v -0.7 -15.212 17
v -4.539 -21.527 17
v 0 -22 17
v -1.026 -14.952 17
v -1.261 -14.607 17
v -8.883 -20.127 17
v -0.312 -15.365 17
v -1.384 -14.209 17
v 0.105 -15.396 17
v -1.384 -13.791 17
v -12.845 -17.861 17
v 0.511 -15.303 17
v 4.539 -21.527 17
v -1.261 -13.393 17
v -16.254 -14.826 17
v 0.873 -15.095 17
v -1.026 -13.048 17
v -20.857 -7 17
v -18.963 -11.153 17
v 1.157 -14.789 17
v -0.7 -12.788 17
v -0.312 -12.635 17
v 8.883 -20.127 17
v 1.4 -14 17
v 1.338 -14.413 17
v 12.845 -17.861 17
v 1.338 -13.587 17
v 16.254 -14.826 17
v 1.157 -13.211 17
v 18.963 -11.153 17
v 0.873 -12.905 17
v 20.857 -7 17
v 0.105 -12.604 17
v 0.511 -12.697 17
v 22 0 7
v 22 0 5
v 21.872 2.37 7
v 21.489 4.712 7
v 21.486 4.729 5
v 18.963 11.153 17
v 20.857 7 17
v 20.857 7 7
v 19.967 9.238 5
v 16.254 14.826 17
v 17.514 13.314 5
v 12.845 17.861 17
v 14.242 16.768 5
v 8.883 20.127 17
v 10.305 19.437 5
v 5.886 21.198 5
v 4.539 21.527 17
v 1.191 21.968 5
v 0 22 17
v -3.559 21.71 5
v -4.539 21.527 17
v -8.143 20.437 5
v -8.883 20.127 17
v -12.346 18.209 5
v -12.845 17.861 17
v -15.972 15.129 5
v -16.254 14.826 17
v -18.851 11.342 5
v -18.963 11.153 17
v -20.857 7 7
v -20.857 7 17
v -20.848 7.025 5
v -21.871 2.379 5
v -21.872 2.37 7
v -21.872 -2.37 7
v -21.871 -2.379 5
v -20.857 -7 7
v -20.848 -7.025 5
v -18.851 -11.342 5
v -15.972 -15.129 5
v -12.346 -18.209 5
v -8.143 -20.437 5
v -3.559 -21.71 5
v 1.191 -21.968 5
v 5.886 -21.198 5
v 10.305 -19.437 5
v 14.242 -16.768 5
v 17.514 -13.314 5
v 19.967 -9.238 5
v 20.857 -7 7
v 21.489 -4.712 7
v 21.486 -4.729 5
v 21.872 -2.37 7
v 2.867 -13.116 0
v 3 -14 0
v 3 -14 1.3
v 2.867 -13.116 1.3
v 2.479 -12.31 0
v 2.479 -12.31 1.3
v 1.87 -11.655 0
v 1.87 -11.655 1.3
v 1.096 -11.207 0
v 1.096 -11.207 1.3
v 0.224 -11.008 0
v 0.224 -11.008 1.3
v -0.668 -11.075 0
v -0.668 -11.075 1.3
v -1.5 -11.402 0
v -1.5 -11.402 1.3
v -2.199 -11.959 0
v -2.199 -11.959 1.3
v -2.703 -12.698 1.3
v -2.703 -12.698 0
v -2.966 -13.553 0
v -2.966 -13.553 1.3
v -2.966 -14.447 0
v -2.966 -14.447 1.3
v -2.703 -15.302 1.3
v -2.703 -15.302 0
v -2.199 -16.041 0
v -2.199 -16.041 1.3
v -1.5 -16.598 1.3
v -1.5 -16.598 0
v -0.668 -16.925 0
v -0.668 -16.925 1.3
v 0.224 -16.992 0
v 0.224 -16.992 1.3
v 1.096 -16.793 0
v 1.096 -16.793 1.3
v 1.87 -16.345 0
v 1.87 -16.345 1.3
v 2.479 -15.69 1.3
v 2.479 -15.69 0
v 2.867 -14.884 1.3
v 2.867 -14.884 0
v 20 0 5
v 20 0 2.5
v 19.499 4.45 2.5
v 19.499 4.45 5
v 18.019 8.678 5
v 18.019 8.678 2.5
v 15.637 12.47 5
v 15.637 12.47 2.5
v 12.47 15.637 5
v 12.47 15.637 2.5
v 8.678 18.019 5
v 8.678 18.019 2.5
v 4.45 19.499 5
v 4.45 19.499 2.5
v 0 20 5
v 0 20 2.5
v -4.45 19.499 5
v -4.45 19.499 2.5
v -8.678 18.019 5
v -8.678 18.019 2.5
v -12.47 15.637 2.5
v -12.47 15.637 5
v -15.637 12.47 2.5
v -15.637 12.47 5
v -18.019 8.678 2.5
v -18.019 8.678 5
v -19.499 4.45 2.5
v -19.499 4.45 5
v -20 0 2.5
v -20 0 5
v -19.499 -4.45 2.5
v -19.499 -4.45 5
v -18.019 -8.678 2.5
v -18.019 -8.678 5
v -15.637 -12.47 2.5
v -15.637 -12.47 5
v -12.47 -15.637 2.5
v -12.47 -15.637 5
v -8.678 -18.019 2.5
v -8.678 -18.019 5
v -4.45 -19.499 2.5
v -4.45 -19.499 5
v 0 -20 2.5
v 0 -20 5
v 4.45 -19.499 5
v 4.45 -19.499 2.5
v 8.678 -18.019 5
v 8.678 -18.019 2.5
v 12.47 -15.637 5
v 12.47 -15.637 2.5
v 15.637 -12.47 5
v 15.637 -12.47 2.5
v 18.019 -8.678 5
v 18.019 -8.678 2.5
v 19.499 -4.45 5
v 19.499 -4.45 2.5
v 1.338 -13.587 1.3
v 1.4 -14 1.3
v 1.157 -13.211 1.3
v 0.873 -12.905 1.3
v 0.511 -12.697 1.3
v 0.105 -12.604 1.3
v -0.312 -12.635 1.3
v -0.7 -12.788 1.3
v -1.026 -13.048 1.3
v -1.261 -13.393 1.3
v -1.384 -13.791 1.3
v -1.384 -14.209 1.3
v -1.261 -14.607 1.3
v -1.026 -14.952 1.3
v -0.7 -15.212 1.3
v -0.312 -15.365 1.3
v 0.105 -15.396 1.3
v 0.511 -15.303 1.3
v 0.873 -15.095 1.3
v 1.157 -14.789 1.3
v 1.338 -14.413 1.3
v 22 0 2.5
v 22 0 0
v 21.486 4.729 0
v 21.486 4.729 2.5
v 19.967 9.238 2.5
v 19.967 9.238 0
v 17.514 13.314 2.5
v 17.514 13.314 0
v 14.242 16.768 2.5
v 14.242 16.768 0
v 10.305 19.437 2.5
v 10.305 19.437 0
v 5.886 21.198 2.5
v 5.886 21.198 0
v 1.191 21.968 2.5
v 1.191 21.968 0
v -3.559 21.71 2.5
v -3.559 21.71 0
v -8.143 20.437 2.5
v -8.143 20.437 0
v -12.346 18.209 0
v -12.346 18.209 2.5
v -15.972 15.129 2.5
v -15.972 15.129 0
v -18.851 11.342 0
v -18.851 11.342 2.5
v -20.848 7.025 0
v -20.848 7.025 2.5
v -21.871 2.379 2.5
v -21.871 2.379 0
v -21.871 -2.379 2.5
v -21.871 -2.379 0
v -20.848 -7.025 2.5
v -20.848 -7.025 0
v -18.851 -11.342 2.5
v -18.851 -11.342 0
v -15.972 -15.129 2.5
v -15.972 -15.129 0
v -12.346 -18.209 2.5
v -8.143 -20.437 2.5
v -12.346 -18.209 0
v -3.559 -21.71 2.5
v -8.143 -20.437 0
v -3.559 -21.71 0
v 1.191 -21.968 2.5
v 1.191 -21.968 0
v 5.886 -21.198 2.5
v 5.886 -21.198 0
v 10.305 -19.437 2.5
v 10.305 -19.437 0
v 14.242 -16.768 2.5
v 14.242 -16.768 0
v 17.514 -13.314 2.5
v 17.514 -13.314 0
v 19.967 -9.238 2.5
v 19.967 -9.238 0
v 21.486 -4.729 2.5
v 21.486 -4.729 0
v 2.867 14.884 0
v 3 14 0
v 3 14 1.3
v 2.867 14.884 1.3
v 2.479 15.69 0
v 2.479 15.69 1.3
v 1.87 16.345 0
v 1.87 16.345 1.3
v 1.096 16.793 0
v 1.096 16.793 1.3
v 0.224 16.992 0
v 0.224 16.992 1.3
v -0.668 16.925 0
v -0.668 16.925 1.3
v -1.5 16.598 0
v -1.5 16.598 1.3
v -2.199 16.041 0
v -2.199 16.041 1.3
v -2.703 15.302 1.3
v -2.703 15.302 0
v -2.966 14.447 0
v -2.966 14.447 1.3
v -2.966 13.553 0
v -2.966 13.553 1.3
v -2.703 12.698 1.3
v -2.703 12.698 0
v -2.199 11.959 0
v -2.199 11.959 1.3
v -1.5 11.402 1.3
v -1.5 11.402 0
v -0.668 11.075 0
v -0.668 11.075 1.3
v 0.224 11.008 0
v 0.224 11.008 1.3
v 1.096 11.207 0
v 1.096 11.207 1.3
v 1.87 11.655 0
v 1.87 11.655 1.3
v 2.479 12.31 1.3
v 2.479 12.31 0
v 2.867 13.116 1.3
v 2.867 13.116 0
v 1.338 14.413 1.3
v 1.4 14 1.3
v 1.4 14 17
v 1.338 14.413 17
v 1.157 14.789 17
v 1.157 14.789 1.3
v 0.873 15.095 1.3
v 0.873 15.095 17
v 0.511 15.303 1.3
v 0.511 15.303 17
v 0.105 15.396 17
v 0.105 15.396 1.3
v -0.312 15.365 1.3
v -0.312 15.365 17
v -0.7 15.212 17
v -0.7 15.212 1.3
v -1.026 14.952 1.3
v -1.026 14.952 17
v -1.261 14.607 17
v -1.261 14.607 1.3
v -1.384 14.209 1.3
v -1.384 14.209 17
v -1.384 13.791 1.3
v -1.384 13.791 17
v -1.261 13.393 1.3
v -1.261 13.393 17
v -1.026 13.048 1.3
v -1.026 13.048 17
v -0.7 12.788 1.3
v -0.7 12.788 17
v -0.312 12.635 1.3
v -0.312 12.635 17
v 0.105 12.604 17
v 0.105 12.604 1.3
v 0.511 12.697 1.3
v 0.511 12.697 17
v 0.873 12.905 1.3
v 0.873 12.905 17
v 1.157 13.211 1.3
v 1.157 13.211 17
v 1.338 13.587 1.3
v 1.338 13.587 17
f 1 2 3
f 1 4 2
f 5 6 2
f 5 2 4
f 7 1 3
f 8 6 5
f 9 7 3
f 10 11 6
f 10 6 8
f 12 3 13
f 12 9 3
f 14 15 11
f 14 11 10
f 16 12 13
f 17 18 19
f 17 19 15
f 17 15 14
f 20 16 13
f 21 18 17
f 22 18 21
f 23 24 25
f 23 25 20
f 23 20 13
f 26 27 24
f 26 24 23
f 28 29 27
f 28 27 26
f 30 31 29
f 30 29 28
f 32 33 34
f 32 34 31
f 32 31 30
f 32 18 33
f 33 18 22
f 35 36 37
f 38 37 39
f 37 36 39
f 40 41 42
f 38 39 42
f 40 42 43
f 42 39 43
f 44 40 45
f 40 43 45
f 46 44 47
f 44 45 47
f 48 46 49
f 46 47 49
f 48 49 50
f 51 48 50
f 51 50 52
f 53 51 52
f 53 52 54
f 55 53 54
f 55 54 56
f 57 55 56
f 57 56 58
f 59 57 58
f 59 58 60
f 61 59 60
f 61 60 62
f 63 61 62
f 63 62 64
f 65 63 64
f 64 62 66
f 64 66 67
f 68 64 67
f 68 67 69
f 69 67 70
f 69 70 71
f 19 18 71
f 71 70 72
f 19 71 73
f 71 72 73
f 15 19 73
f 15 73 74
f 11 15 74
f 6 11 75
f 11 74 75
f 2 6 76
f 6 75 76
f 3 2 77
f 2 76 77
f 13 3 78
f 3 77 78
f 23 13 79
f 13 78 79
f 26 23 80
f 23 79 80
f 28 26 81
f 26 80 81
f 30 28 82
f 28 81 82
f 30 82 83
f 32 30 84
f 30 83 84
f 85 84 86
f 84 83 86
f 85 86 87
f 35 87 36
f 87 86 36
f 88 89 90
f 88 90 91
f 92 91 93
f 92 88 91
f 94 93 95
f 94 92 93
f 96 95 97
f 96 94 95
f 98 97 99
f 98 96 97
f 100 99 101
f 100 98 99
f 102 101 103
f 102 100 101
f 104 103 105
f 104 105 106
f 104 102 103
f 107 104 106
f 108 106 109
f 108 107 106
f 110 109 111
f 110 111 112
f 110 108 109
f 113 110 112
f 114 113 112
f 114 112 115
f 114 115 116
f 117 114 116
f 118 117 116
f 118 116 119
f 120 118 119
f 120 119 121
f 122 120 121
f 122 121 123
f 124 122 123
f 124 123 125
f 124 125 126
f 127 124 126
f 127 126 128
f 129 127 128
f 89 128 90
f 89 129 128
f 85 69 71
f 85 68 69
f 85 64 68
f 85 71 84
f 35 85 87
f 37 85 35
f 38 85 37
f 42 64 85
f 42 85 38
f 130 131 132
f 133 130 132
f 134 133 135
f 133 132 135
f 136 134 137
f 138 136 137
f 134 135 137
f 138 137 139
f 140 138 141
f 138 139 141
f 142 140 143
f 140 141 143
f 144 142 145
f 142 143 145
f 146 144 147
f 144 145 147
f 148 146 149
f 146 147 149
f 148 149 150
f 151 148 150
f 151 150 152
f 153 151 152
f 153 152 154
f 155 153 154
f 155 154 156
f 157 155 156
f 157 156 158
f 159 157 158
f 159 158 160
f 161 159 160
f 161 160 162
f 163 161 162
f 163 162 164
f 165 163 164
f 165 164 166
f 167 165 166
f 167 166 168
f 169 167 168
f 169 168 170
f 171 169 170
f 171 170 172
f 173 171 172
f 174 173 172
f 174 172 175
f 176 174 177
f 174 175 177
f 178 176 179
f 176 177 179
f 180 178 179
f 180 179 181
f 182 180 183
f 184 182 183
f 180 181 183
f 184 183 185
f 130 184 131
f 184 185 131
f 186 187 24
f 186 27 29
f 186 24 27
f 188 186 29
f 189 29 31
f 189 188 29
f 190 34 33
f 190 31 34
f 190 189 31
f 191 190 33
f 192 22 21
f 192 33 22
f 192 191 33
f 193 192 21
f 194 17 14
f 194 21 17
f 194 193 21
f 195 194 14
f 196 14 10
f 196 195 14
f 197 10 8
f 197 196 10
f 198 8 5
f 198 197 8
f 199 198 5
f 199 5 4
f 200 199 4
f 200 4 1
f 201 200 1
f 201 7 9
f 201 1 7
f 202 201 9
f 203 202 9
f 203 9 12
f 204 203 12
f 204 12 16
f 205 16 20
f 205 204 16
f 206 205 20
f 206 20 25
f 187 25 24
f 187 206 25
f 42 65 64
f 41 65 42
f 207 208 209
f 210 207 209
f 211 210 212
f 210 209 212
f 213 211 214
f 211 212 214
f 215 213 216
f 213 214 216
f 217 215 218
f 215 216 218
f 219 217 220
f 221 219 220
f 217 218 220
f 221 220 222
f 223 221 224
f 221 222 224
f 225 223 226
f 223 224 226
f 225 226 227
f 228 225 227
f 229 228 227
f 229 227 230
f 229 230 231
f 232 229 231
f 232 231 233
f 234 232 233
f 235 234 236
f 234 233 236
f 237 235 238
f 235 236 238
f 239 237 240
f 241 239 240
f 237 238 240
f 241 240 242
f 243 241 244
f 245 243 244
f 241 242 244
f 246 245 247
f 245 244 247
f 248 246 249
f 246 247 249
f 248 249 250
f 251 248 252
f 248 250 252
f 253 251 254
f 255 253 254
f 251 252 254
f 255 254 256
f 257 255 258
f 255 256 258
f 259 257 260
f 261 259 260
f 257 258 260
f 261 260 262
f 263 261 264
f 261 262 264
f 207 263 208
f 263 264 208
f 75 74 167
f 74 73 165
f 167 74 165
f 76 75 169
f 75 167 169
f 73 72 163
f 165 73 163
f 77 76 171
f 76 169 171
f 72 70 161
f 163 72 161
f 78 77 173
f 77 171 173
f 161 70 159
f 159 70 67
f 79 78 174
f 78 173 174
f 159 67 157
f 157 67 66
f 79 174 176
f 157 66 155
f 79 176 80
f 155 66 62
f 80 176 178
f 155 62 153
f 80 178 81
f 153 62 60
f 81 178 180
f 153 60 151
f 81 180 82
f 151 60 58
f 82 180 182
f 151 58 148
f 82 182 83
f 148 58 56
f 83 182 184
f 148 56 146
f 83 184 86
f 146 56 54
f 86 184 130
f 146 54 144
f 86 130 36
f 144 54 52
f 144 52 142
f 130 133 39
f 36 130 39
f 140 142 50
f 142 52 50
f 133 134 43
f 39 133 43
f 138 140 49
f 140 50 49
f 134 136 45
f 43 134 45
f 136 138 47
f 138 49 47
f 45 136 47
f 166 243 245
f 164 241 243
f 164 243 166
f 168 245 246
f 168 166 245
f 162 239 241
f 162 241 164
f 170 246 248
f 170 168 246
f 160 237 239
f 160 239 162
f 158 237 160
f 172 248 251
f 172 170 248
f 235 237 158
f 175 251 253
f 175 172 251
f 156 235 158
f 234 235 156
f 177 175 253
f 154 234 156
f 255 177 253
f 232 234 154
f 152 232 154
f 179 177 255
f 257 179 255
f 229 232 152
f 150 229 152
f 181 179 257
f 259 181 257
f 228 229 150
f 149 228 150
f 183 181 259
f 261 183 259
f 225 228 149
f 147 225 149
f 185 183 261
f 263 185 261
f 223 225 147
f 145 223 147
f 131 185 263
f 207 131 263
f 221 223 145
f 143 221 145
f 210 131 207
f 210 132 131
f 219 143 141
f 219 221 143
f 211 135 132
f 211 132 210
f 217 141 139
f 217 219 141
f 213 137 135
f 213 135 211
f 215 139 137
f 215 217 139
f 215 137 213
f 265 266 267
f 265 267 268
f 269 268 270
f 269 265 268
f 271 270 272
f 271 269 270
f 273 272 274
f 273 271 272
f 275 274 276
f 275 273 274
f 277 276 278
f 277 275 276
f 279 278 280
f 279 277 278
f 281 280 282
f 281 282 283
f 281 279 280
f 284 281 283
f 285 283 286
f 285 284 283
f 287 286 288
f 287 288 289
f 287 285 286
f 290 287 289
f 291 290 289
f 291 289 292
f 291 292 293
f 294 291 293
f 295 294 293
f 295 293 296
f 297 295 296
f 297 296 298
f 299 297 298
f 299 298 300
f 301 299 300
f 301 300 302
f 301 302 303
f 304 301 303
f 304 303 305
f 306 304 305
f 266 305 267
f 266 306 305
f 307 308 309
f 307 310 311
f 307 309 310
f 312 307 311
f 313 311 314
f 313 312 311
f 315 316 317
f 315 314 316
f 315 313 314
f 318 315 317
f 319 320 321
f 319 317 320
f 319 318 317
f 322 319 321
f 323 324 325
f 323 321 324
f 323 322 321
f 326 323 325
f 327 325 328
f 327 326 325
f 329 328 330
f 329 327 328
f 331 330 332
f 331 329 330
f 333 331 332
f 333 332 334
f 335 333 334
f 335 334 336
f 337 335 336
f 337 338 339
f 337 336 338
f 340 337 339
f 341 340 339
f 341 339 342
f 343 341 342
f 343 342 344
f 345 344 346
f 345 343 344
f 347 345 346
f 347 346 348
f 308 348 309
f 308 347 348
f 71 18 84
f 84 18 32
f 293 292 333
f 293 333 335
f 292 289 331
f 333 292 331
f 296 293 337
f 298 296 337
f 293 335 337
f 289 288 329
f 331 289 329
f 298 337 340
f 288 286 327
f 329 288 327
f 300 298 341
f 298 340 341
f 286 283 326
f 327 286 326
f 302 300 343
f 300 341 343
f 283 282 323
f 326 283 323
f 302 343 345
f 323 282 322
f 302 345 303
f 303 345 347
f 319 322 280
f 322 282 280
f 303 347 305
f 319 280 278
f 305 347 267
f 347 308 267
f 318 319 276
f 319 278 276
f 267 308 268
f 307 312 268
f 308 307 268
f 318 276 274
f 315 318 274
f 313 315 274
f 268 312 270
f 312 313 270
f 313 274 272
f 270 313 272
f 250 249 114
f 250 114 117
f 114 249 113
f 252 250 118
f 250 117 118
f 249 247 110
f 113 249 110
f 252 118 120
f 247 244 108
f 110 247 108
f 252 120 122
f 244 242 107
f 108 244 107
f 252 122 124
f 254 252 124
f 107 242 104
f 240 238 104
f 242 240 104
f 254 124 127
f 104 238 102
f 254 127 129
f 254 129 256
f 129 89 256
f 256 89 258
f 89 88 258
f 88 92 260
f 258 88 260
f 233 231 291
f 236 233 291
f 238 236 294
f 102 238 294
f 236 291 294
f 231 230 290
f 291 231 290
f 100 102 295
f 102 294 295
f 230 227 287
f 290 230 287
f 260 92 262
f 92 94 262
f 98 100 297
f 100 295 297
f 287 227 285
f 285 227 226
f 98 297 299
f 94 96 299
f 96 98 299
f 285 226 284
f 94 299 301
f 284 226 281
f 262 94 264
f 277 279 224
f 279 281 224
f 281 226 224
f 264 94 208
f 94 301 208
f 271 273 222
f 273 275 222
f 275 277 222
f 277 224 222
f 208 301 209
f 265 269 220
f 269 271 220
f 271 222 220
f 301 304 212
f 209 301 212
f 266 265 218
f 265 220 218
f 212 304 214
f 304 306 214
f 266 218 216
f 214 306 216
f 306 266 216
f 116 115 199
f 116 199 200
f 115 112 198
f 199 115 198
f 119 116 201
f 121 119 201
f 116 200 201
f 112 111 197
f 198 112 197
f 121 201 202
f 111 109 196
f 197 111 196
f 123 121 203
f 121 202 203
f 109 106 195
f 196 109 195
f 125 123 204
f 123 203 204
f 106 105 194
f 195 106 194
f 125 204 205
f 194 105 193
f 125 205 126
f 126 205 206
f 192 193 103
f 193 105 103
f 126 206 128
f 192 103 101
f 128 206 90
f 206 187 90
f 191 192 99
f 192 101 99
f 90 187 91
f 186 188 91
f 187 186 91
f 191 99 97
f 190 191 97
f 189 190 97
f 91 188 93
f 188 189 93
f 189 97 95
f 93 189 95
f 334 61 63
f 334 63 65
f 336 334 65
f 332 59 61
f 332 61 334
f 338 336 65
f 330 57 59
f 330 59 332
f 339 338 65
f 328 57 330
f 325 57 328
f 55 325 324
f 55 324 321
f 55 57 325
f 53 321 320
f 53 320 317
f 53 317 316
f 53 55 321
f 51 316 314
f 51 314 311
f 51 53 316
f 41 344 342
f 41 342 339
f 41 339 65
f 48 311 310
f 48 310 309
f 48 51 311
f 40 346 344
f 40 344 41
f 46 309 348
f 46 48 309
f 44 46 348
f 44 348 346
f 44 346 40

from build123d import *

# Parameters (mm, degrees)
SKETCH1_R           = 22
BOSS_EXTRUDE1_DEPTH = 2.5
SKETCH2_R           = 20
BOSS_EXTRUDE2_DEPTH = 5
BOSS_EXTRUDE3_START = 5
SKETCH1_2_R         = 22
BOSS_EXTRUDE3_DEPTH = 12
CUT_EXTRUDE1_START  = 17
SKETCH3_W           = 56.338981098
SKETCH3_H           = 14
CUT_EXTRUDE1_DEPTH  = 10
SKETCH4_R           = 1.4
CUT_EXTRUDE2_DEPTH  = 18
SKETCH5_R           = 3
CUT_EXTRUDE3_DEPTH  = 1.3


with BuildPart() as part:
    # Sketch1 → Boss-Extrude1 (new body)
    with BuildSketch(Plane.XY):
        Circle(SKETCH1_R)
    extrude(amount=BOSS_EXTRUDE1_DEPTH)

    # Sketch2 → Boss-Extrude2 (add)
    with BuildSketch(Plane.XY):
        Circle(SKETCH2_R)
    extrude(amount=BOSS_EXTRUDE2_DEPTH)

    # Sketch1<2> → Boss-Extrude3 (add)
    with BuildSketch(Plane.XY.offset(BOSS_EXTRUDE3_START)):
        Circle(SKETCH1_2_R)
    extrude(amount=BOSS_EXTRUDE3_DEPTH)

    # Sketch3 → Cut-Extrude1 (cut)
    with BuildSketch(Plane.XY.offset(CUT_EXTRUDE1_START)):
        with Locations((-1.268364496, 0)):
            Rectangle(SKETCH3_W, SKETCH3_H)
    extrude(amount=-CUT_EXTRUDE1_DEPTH, mode=Mode.SUBTRACT)

    # Sketch4 → Cut-Extrude2 (cut, through all)
    with BuildSketch(Plane.XY):
        with Locations((0, 14)):
            Circle(SKETCH4_R)
        with Locations((0, -14)):
            Circle(SKETCH4_R)
    extrude(amount=CUT_EXTRUDE2_DEPTH, mode=Mode.SUBTRACT)

    # Sketch5 → Cut-Extrude3 (cut)
    with BuildSketch(Plane.XY):
        with Locations((0, 14)):
            Circle(SKETCH5_R)
        with Locations((0, -14)):
            Circle(SKETCH5_R)
    extrude(amount=CUT_EXTRUDE3_DEPTH, mode=Mode.SUBTRACT)


solid = part.part
